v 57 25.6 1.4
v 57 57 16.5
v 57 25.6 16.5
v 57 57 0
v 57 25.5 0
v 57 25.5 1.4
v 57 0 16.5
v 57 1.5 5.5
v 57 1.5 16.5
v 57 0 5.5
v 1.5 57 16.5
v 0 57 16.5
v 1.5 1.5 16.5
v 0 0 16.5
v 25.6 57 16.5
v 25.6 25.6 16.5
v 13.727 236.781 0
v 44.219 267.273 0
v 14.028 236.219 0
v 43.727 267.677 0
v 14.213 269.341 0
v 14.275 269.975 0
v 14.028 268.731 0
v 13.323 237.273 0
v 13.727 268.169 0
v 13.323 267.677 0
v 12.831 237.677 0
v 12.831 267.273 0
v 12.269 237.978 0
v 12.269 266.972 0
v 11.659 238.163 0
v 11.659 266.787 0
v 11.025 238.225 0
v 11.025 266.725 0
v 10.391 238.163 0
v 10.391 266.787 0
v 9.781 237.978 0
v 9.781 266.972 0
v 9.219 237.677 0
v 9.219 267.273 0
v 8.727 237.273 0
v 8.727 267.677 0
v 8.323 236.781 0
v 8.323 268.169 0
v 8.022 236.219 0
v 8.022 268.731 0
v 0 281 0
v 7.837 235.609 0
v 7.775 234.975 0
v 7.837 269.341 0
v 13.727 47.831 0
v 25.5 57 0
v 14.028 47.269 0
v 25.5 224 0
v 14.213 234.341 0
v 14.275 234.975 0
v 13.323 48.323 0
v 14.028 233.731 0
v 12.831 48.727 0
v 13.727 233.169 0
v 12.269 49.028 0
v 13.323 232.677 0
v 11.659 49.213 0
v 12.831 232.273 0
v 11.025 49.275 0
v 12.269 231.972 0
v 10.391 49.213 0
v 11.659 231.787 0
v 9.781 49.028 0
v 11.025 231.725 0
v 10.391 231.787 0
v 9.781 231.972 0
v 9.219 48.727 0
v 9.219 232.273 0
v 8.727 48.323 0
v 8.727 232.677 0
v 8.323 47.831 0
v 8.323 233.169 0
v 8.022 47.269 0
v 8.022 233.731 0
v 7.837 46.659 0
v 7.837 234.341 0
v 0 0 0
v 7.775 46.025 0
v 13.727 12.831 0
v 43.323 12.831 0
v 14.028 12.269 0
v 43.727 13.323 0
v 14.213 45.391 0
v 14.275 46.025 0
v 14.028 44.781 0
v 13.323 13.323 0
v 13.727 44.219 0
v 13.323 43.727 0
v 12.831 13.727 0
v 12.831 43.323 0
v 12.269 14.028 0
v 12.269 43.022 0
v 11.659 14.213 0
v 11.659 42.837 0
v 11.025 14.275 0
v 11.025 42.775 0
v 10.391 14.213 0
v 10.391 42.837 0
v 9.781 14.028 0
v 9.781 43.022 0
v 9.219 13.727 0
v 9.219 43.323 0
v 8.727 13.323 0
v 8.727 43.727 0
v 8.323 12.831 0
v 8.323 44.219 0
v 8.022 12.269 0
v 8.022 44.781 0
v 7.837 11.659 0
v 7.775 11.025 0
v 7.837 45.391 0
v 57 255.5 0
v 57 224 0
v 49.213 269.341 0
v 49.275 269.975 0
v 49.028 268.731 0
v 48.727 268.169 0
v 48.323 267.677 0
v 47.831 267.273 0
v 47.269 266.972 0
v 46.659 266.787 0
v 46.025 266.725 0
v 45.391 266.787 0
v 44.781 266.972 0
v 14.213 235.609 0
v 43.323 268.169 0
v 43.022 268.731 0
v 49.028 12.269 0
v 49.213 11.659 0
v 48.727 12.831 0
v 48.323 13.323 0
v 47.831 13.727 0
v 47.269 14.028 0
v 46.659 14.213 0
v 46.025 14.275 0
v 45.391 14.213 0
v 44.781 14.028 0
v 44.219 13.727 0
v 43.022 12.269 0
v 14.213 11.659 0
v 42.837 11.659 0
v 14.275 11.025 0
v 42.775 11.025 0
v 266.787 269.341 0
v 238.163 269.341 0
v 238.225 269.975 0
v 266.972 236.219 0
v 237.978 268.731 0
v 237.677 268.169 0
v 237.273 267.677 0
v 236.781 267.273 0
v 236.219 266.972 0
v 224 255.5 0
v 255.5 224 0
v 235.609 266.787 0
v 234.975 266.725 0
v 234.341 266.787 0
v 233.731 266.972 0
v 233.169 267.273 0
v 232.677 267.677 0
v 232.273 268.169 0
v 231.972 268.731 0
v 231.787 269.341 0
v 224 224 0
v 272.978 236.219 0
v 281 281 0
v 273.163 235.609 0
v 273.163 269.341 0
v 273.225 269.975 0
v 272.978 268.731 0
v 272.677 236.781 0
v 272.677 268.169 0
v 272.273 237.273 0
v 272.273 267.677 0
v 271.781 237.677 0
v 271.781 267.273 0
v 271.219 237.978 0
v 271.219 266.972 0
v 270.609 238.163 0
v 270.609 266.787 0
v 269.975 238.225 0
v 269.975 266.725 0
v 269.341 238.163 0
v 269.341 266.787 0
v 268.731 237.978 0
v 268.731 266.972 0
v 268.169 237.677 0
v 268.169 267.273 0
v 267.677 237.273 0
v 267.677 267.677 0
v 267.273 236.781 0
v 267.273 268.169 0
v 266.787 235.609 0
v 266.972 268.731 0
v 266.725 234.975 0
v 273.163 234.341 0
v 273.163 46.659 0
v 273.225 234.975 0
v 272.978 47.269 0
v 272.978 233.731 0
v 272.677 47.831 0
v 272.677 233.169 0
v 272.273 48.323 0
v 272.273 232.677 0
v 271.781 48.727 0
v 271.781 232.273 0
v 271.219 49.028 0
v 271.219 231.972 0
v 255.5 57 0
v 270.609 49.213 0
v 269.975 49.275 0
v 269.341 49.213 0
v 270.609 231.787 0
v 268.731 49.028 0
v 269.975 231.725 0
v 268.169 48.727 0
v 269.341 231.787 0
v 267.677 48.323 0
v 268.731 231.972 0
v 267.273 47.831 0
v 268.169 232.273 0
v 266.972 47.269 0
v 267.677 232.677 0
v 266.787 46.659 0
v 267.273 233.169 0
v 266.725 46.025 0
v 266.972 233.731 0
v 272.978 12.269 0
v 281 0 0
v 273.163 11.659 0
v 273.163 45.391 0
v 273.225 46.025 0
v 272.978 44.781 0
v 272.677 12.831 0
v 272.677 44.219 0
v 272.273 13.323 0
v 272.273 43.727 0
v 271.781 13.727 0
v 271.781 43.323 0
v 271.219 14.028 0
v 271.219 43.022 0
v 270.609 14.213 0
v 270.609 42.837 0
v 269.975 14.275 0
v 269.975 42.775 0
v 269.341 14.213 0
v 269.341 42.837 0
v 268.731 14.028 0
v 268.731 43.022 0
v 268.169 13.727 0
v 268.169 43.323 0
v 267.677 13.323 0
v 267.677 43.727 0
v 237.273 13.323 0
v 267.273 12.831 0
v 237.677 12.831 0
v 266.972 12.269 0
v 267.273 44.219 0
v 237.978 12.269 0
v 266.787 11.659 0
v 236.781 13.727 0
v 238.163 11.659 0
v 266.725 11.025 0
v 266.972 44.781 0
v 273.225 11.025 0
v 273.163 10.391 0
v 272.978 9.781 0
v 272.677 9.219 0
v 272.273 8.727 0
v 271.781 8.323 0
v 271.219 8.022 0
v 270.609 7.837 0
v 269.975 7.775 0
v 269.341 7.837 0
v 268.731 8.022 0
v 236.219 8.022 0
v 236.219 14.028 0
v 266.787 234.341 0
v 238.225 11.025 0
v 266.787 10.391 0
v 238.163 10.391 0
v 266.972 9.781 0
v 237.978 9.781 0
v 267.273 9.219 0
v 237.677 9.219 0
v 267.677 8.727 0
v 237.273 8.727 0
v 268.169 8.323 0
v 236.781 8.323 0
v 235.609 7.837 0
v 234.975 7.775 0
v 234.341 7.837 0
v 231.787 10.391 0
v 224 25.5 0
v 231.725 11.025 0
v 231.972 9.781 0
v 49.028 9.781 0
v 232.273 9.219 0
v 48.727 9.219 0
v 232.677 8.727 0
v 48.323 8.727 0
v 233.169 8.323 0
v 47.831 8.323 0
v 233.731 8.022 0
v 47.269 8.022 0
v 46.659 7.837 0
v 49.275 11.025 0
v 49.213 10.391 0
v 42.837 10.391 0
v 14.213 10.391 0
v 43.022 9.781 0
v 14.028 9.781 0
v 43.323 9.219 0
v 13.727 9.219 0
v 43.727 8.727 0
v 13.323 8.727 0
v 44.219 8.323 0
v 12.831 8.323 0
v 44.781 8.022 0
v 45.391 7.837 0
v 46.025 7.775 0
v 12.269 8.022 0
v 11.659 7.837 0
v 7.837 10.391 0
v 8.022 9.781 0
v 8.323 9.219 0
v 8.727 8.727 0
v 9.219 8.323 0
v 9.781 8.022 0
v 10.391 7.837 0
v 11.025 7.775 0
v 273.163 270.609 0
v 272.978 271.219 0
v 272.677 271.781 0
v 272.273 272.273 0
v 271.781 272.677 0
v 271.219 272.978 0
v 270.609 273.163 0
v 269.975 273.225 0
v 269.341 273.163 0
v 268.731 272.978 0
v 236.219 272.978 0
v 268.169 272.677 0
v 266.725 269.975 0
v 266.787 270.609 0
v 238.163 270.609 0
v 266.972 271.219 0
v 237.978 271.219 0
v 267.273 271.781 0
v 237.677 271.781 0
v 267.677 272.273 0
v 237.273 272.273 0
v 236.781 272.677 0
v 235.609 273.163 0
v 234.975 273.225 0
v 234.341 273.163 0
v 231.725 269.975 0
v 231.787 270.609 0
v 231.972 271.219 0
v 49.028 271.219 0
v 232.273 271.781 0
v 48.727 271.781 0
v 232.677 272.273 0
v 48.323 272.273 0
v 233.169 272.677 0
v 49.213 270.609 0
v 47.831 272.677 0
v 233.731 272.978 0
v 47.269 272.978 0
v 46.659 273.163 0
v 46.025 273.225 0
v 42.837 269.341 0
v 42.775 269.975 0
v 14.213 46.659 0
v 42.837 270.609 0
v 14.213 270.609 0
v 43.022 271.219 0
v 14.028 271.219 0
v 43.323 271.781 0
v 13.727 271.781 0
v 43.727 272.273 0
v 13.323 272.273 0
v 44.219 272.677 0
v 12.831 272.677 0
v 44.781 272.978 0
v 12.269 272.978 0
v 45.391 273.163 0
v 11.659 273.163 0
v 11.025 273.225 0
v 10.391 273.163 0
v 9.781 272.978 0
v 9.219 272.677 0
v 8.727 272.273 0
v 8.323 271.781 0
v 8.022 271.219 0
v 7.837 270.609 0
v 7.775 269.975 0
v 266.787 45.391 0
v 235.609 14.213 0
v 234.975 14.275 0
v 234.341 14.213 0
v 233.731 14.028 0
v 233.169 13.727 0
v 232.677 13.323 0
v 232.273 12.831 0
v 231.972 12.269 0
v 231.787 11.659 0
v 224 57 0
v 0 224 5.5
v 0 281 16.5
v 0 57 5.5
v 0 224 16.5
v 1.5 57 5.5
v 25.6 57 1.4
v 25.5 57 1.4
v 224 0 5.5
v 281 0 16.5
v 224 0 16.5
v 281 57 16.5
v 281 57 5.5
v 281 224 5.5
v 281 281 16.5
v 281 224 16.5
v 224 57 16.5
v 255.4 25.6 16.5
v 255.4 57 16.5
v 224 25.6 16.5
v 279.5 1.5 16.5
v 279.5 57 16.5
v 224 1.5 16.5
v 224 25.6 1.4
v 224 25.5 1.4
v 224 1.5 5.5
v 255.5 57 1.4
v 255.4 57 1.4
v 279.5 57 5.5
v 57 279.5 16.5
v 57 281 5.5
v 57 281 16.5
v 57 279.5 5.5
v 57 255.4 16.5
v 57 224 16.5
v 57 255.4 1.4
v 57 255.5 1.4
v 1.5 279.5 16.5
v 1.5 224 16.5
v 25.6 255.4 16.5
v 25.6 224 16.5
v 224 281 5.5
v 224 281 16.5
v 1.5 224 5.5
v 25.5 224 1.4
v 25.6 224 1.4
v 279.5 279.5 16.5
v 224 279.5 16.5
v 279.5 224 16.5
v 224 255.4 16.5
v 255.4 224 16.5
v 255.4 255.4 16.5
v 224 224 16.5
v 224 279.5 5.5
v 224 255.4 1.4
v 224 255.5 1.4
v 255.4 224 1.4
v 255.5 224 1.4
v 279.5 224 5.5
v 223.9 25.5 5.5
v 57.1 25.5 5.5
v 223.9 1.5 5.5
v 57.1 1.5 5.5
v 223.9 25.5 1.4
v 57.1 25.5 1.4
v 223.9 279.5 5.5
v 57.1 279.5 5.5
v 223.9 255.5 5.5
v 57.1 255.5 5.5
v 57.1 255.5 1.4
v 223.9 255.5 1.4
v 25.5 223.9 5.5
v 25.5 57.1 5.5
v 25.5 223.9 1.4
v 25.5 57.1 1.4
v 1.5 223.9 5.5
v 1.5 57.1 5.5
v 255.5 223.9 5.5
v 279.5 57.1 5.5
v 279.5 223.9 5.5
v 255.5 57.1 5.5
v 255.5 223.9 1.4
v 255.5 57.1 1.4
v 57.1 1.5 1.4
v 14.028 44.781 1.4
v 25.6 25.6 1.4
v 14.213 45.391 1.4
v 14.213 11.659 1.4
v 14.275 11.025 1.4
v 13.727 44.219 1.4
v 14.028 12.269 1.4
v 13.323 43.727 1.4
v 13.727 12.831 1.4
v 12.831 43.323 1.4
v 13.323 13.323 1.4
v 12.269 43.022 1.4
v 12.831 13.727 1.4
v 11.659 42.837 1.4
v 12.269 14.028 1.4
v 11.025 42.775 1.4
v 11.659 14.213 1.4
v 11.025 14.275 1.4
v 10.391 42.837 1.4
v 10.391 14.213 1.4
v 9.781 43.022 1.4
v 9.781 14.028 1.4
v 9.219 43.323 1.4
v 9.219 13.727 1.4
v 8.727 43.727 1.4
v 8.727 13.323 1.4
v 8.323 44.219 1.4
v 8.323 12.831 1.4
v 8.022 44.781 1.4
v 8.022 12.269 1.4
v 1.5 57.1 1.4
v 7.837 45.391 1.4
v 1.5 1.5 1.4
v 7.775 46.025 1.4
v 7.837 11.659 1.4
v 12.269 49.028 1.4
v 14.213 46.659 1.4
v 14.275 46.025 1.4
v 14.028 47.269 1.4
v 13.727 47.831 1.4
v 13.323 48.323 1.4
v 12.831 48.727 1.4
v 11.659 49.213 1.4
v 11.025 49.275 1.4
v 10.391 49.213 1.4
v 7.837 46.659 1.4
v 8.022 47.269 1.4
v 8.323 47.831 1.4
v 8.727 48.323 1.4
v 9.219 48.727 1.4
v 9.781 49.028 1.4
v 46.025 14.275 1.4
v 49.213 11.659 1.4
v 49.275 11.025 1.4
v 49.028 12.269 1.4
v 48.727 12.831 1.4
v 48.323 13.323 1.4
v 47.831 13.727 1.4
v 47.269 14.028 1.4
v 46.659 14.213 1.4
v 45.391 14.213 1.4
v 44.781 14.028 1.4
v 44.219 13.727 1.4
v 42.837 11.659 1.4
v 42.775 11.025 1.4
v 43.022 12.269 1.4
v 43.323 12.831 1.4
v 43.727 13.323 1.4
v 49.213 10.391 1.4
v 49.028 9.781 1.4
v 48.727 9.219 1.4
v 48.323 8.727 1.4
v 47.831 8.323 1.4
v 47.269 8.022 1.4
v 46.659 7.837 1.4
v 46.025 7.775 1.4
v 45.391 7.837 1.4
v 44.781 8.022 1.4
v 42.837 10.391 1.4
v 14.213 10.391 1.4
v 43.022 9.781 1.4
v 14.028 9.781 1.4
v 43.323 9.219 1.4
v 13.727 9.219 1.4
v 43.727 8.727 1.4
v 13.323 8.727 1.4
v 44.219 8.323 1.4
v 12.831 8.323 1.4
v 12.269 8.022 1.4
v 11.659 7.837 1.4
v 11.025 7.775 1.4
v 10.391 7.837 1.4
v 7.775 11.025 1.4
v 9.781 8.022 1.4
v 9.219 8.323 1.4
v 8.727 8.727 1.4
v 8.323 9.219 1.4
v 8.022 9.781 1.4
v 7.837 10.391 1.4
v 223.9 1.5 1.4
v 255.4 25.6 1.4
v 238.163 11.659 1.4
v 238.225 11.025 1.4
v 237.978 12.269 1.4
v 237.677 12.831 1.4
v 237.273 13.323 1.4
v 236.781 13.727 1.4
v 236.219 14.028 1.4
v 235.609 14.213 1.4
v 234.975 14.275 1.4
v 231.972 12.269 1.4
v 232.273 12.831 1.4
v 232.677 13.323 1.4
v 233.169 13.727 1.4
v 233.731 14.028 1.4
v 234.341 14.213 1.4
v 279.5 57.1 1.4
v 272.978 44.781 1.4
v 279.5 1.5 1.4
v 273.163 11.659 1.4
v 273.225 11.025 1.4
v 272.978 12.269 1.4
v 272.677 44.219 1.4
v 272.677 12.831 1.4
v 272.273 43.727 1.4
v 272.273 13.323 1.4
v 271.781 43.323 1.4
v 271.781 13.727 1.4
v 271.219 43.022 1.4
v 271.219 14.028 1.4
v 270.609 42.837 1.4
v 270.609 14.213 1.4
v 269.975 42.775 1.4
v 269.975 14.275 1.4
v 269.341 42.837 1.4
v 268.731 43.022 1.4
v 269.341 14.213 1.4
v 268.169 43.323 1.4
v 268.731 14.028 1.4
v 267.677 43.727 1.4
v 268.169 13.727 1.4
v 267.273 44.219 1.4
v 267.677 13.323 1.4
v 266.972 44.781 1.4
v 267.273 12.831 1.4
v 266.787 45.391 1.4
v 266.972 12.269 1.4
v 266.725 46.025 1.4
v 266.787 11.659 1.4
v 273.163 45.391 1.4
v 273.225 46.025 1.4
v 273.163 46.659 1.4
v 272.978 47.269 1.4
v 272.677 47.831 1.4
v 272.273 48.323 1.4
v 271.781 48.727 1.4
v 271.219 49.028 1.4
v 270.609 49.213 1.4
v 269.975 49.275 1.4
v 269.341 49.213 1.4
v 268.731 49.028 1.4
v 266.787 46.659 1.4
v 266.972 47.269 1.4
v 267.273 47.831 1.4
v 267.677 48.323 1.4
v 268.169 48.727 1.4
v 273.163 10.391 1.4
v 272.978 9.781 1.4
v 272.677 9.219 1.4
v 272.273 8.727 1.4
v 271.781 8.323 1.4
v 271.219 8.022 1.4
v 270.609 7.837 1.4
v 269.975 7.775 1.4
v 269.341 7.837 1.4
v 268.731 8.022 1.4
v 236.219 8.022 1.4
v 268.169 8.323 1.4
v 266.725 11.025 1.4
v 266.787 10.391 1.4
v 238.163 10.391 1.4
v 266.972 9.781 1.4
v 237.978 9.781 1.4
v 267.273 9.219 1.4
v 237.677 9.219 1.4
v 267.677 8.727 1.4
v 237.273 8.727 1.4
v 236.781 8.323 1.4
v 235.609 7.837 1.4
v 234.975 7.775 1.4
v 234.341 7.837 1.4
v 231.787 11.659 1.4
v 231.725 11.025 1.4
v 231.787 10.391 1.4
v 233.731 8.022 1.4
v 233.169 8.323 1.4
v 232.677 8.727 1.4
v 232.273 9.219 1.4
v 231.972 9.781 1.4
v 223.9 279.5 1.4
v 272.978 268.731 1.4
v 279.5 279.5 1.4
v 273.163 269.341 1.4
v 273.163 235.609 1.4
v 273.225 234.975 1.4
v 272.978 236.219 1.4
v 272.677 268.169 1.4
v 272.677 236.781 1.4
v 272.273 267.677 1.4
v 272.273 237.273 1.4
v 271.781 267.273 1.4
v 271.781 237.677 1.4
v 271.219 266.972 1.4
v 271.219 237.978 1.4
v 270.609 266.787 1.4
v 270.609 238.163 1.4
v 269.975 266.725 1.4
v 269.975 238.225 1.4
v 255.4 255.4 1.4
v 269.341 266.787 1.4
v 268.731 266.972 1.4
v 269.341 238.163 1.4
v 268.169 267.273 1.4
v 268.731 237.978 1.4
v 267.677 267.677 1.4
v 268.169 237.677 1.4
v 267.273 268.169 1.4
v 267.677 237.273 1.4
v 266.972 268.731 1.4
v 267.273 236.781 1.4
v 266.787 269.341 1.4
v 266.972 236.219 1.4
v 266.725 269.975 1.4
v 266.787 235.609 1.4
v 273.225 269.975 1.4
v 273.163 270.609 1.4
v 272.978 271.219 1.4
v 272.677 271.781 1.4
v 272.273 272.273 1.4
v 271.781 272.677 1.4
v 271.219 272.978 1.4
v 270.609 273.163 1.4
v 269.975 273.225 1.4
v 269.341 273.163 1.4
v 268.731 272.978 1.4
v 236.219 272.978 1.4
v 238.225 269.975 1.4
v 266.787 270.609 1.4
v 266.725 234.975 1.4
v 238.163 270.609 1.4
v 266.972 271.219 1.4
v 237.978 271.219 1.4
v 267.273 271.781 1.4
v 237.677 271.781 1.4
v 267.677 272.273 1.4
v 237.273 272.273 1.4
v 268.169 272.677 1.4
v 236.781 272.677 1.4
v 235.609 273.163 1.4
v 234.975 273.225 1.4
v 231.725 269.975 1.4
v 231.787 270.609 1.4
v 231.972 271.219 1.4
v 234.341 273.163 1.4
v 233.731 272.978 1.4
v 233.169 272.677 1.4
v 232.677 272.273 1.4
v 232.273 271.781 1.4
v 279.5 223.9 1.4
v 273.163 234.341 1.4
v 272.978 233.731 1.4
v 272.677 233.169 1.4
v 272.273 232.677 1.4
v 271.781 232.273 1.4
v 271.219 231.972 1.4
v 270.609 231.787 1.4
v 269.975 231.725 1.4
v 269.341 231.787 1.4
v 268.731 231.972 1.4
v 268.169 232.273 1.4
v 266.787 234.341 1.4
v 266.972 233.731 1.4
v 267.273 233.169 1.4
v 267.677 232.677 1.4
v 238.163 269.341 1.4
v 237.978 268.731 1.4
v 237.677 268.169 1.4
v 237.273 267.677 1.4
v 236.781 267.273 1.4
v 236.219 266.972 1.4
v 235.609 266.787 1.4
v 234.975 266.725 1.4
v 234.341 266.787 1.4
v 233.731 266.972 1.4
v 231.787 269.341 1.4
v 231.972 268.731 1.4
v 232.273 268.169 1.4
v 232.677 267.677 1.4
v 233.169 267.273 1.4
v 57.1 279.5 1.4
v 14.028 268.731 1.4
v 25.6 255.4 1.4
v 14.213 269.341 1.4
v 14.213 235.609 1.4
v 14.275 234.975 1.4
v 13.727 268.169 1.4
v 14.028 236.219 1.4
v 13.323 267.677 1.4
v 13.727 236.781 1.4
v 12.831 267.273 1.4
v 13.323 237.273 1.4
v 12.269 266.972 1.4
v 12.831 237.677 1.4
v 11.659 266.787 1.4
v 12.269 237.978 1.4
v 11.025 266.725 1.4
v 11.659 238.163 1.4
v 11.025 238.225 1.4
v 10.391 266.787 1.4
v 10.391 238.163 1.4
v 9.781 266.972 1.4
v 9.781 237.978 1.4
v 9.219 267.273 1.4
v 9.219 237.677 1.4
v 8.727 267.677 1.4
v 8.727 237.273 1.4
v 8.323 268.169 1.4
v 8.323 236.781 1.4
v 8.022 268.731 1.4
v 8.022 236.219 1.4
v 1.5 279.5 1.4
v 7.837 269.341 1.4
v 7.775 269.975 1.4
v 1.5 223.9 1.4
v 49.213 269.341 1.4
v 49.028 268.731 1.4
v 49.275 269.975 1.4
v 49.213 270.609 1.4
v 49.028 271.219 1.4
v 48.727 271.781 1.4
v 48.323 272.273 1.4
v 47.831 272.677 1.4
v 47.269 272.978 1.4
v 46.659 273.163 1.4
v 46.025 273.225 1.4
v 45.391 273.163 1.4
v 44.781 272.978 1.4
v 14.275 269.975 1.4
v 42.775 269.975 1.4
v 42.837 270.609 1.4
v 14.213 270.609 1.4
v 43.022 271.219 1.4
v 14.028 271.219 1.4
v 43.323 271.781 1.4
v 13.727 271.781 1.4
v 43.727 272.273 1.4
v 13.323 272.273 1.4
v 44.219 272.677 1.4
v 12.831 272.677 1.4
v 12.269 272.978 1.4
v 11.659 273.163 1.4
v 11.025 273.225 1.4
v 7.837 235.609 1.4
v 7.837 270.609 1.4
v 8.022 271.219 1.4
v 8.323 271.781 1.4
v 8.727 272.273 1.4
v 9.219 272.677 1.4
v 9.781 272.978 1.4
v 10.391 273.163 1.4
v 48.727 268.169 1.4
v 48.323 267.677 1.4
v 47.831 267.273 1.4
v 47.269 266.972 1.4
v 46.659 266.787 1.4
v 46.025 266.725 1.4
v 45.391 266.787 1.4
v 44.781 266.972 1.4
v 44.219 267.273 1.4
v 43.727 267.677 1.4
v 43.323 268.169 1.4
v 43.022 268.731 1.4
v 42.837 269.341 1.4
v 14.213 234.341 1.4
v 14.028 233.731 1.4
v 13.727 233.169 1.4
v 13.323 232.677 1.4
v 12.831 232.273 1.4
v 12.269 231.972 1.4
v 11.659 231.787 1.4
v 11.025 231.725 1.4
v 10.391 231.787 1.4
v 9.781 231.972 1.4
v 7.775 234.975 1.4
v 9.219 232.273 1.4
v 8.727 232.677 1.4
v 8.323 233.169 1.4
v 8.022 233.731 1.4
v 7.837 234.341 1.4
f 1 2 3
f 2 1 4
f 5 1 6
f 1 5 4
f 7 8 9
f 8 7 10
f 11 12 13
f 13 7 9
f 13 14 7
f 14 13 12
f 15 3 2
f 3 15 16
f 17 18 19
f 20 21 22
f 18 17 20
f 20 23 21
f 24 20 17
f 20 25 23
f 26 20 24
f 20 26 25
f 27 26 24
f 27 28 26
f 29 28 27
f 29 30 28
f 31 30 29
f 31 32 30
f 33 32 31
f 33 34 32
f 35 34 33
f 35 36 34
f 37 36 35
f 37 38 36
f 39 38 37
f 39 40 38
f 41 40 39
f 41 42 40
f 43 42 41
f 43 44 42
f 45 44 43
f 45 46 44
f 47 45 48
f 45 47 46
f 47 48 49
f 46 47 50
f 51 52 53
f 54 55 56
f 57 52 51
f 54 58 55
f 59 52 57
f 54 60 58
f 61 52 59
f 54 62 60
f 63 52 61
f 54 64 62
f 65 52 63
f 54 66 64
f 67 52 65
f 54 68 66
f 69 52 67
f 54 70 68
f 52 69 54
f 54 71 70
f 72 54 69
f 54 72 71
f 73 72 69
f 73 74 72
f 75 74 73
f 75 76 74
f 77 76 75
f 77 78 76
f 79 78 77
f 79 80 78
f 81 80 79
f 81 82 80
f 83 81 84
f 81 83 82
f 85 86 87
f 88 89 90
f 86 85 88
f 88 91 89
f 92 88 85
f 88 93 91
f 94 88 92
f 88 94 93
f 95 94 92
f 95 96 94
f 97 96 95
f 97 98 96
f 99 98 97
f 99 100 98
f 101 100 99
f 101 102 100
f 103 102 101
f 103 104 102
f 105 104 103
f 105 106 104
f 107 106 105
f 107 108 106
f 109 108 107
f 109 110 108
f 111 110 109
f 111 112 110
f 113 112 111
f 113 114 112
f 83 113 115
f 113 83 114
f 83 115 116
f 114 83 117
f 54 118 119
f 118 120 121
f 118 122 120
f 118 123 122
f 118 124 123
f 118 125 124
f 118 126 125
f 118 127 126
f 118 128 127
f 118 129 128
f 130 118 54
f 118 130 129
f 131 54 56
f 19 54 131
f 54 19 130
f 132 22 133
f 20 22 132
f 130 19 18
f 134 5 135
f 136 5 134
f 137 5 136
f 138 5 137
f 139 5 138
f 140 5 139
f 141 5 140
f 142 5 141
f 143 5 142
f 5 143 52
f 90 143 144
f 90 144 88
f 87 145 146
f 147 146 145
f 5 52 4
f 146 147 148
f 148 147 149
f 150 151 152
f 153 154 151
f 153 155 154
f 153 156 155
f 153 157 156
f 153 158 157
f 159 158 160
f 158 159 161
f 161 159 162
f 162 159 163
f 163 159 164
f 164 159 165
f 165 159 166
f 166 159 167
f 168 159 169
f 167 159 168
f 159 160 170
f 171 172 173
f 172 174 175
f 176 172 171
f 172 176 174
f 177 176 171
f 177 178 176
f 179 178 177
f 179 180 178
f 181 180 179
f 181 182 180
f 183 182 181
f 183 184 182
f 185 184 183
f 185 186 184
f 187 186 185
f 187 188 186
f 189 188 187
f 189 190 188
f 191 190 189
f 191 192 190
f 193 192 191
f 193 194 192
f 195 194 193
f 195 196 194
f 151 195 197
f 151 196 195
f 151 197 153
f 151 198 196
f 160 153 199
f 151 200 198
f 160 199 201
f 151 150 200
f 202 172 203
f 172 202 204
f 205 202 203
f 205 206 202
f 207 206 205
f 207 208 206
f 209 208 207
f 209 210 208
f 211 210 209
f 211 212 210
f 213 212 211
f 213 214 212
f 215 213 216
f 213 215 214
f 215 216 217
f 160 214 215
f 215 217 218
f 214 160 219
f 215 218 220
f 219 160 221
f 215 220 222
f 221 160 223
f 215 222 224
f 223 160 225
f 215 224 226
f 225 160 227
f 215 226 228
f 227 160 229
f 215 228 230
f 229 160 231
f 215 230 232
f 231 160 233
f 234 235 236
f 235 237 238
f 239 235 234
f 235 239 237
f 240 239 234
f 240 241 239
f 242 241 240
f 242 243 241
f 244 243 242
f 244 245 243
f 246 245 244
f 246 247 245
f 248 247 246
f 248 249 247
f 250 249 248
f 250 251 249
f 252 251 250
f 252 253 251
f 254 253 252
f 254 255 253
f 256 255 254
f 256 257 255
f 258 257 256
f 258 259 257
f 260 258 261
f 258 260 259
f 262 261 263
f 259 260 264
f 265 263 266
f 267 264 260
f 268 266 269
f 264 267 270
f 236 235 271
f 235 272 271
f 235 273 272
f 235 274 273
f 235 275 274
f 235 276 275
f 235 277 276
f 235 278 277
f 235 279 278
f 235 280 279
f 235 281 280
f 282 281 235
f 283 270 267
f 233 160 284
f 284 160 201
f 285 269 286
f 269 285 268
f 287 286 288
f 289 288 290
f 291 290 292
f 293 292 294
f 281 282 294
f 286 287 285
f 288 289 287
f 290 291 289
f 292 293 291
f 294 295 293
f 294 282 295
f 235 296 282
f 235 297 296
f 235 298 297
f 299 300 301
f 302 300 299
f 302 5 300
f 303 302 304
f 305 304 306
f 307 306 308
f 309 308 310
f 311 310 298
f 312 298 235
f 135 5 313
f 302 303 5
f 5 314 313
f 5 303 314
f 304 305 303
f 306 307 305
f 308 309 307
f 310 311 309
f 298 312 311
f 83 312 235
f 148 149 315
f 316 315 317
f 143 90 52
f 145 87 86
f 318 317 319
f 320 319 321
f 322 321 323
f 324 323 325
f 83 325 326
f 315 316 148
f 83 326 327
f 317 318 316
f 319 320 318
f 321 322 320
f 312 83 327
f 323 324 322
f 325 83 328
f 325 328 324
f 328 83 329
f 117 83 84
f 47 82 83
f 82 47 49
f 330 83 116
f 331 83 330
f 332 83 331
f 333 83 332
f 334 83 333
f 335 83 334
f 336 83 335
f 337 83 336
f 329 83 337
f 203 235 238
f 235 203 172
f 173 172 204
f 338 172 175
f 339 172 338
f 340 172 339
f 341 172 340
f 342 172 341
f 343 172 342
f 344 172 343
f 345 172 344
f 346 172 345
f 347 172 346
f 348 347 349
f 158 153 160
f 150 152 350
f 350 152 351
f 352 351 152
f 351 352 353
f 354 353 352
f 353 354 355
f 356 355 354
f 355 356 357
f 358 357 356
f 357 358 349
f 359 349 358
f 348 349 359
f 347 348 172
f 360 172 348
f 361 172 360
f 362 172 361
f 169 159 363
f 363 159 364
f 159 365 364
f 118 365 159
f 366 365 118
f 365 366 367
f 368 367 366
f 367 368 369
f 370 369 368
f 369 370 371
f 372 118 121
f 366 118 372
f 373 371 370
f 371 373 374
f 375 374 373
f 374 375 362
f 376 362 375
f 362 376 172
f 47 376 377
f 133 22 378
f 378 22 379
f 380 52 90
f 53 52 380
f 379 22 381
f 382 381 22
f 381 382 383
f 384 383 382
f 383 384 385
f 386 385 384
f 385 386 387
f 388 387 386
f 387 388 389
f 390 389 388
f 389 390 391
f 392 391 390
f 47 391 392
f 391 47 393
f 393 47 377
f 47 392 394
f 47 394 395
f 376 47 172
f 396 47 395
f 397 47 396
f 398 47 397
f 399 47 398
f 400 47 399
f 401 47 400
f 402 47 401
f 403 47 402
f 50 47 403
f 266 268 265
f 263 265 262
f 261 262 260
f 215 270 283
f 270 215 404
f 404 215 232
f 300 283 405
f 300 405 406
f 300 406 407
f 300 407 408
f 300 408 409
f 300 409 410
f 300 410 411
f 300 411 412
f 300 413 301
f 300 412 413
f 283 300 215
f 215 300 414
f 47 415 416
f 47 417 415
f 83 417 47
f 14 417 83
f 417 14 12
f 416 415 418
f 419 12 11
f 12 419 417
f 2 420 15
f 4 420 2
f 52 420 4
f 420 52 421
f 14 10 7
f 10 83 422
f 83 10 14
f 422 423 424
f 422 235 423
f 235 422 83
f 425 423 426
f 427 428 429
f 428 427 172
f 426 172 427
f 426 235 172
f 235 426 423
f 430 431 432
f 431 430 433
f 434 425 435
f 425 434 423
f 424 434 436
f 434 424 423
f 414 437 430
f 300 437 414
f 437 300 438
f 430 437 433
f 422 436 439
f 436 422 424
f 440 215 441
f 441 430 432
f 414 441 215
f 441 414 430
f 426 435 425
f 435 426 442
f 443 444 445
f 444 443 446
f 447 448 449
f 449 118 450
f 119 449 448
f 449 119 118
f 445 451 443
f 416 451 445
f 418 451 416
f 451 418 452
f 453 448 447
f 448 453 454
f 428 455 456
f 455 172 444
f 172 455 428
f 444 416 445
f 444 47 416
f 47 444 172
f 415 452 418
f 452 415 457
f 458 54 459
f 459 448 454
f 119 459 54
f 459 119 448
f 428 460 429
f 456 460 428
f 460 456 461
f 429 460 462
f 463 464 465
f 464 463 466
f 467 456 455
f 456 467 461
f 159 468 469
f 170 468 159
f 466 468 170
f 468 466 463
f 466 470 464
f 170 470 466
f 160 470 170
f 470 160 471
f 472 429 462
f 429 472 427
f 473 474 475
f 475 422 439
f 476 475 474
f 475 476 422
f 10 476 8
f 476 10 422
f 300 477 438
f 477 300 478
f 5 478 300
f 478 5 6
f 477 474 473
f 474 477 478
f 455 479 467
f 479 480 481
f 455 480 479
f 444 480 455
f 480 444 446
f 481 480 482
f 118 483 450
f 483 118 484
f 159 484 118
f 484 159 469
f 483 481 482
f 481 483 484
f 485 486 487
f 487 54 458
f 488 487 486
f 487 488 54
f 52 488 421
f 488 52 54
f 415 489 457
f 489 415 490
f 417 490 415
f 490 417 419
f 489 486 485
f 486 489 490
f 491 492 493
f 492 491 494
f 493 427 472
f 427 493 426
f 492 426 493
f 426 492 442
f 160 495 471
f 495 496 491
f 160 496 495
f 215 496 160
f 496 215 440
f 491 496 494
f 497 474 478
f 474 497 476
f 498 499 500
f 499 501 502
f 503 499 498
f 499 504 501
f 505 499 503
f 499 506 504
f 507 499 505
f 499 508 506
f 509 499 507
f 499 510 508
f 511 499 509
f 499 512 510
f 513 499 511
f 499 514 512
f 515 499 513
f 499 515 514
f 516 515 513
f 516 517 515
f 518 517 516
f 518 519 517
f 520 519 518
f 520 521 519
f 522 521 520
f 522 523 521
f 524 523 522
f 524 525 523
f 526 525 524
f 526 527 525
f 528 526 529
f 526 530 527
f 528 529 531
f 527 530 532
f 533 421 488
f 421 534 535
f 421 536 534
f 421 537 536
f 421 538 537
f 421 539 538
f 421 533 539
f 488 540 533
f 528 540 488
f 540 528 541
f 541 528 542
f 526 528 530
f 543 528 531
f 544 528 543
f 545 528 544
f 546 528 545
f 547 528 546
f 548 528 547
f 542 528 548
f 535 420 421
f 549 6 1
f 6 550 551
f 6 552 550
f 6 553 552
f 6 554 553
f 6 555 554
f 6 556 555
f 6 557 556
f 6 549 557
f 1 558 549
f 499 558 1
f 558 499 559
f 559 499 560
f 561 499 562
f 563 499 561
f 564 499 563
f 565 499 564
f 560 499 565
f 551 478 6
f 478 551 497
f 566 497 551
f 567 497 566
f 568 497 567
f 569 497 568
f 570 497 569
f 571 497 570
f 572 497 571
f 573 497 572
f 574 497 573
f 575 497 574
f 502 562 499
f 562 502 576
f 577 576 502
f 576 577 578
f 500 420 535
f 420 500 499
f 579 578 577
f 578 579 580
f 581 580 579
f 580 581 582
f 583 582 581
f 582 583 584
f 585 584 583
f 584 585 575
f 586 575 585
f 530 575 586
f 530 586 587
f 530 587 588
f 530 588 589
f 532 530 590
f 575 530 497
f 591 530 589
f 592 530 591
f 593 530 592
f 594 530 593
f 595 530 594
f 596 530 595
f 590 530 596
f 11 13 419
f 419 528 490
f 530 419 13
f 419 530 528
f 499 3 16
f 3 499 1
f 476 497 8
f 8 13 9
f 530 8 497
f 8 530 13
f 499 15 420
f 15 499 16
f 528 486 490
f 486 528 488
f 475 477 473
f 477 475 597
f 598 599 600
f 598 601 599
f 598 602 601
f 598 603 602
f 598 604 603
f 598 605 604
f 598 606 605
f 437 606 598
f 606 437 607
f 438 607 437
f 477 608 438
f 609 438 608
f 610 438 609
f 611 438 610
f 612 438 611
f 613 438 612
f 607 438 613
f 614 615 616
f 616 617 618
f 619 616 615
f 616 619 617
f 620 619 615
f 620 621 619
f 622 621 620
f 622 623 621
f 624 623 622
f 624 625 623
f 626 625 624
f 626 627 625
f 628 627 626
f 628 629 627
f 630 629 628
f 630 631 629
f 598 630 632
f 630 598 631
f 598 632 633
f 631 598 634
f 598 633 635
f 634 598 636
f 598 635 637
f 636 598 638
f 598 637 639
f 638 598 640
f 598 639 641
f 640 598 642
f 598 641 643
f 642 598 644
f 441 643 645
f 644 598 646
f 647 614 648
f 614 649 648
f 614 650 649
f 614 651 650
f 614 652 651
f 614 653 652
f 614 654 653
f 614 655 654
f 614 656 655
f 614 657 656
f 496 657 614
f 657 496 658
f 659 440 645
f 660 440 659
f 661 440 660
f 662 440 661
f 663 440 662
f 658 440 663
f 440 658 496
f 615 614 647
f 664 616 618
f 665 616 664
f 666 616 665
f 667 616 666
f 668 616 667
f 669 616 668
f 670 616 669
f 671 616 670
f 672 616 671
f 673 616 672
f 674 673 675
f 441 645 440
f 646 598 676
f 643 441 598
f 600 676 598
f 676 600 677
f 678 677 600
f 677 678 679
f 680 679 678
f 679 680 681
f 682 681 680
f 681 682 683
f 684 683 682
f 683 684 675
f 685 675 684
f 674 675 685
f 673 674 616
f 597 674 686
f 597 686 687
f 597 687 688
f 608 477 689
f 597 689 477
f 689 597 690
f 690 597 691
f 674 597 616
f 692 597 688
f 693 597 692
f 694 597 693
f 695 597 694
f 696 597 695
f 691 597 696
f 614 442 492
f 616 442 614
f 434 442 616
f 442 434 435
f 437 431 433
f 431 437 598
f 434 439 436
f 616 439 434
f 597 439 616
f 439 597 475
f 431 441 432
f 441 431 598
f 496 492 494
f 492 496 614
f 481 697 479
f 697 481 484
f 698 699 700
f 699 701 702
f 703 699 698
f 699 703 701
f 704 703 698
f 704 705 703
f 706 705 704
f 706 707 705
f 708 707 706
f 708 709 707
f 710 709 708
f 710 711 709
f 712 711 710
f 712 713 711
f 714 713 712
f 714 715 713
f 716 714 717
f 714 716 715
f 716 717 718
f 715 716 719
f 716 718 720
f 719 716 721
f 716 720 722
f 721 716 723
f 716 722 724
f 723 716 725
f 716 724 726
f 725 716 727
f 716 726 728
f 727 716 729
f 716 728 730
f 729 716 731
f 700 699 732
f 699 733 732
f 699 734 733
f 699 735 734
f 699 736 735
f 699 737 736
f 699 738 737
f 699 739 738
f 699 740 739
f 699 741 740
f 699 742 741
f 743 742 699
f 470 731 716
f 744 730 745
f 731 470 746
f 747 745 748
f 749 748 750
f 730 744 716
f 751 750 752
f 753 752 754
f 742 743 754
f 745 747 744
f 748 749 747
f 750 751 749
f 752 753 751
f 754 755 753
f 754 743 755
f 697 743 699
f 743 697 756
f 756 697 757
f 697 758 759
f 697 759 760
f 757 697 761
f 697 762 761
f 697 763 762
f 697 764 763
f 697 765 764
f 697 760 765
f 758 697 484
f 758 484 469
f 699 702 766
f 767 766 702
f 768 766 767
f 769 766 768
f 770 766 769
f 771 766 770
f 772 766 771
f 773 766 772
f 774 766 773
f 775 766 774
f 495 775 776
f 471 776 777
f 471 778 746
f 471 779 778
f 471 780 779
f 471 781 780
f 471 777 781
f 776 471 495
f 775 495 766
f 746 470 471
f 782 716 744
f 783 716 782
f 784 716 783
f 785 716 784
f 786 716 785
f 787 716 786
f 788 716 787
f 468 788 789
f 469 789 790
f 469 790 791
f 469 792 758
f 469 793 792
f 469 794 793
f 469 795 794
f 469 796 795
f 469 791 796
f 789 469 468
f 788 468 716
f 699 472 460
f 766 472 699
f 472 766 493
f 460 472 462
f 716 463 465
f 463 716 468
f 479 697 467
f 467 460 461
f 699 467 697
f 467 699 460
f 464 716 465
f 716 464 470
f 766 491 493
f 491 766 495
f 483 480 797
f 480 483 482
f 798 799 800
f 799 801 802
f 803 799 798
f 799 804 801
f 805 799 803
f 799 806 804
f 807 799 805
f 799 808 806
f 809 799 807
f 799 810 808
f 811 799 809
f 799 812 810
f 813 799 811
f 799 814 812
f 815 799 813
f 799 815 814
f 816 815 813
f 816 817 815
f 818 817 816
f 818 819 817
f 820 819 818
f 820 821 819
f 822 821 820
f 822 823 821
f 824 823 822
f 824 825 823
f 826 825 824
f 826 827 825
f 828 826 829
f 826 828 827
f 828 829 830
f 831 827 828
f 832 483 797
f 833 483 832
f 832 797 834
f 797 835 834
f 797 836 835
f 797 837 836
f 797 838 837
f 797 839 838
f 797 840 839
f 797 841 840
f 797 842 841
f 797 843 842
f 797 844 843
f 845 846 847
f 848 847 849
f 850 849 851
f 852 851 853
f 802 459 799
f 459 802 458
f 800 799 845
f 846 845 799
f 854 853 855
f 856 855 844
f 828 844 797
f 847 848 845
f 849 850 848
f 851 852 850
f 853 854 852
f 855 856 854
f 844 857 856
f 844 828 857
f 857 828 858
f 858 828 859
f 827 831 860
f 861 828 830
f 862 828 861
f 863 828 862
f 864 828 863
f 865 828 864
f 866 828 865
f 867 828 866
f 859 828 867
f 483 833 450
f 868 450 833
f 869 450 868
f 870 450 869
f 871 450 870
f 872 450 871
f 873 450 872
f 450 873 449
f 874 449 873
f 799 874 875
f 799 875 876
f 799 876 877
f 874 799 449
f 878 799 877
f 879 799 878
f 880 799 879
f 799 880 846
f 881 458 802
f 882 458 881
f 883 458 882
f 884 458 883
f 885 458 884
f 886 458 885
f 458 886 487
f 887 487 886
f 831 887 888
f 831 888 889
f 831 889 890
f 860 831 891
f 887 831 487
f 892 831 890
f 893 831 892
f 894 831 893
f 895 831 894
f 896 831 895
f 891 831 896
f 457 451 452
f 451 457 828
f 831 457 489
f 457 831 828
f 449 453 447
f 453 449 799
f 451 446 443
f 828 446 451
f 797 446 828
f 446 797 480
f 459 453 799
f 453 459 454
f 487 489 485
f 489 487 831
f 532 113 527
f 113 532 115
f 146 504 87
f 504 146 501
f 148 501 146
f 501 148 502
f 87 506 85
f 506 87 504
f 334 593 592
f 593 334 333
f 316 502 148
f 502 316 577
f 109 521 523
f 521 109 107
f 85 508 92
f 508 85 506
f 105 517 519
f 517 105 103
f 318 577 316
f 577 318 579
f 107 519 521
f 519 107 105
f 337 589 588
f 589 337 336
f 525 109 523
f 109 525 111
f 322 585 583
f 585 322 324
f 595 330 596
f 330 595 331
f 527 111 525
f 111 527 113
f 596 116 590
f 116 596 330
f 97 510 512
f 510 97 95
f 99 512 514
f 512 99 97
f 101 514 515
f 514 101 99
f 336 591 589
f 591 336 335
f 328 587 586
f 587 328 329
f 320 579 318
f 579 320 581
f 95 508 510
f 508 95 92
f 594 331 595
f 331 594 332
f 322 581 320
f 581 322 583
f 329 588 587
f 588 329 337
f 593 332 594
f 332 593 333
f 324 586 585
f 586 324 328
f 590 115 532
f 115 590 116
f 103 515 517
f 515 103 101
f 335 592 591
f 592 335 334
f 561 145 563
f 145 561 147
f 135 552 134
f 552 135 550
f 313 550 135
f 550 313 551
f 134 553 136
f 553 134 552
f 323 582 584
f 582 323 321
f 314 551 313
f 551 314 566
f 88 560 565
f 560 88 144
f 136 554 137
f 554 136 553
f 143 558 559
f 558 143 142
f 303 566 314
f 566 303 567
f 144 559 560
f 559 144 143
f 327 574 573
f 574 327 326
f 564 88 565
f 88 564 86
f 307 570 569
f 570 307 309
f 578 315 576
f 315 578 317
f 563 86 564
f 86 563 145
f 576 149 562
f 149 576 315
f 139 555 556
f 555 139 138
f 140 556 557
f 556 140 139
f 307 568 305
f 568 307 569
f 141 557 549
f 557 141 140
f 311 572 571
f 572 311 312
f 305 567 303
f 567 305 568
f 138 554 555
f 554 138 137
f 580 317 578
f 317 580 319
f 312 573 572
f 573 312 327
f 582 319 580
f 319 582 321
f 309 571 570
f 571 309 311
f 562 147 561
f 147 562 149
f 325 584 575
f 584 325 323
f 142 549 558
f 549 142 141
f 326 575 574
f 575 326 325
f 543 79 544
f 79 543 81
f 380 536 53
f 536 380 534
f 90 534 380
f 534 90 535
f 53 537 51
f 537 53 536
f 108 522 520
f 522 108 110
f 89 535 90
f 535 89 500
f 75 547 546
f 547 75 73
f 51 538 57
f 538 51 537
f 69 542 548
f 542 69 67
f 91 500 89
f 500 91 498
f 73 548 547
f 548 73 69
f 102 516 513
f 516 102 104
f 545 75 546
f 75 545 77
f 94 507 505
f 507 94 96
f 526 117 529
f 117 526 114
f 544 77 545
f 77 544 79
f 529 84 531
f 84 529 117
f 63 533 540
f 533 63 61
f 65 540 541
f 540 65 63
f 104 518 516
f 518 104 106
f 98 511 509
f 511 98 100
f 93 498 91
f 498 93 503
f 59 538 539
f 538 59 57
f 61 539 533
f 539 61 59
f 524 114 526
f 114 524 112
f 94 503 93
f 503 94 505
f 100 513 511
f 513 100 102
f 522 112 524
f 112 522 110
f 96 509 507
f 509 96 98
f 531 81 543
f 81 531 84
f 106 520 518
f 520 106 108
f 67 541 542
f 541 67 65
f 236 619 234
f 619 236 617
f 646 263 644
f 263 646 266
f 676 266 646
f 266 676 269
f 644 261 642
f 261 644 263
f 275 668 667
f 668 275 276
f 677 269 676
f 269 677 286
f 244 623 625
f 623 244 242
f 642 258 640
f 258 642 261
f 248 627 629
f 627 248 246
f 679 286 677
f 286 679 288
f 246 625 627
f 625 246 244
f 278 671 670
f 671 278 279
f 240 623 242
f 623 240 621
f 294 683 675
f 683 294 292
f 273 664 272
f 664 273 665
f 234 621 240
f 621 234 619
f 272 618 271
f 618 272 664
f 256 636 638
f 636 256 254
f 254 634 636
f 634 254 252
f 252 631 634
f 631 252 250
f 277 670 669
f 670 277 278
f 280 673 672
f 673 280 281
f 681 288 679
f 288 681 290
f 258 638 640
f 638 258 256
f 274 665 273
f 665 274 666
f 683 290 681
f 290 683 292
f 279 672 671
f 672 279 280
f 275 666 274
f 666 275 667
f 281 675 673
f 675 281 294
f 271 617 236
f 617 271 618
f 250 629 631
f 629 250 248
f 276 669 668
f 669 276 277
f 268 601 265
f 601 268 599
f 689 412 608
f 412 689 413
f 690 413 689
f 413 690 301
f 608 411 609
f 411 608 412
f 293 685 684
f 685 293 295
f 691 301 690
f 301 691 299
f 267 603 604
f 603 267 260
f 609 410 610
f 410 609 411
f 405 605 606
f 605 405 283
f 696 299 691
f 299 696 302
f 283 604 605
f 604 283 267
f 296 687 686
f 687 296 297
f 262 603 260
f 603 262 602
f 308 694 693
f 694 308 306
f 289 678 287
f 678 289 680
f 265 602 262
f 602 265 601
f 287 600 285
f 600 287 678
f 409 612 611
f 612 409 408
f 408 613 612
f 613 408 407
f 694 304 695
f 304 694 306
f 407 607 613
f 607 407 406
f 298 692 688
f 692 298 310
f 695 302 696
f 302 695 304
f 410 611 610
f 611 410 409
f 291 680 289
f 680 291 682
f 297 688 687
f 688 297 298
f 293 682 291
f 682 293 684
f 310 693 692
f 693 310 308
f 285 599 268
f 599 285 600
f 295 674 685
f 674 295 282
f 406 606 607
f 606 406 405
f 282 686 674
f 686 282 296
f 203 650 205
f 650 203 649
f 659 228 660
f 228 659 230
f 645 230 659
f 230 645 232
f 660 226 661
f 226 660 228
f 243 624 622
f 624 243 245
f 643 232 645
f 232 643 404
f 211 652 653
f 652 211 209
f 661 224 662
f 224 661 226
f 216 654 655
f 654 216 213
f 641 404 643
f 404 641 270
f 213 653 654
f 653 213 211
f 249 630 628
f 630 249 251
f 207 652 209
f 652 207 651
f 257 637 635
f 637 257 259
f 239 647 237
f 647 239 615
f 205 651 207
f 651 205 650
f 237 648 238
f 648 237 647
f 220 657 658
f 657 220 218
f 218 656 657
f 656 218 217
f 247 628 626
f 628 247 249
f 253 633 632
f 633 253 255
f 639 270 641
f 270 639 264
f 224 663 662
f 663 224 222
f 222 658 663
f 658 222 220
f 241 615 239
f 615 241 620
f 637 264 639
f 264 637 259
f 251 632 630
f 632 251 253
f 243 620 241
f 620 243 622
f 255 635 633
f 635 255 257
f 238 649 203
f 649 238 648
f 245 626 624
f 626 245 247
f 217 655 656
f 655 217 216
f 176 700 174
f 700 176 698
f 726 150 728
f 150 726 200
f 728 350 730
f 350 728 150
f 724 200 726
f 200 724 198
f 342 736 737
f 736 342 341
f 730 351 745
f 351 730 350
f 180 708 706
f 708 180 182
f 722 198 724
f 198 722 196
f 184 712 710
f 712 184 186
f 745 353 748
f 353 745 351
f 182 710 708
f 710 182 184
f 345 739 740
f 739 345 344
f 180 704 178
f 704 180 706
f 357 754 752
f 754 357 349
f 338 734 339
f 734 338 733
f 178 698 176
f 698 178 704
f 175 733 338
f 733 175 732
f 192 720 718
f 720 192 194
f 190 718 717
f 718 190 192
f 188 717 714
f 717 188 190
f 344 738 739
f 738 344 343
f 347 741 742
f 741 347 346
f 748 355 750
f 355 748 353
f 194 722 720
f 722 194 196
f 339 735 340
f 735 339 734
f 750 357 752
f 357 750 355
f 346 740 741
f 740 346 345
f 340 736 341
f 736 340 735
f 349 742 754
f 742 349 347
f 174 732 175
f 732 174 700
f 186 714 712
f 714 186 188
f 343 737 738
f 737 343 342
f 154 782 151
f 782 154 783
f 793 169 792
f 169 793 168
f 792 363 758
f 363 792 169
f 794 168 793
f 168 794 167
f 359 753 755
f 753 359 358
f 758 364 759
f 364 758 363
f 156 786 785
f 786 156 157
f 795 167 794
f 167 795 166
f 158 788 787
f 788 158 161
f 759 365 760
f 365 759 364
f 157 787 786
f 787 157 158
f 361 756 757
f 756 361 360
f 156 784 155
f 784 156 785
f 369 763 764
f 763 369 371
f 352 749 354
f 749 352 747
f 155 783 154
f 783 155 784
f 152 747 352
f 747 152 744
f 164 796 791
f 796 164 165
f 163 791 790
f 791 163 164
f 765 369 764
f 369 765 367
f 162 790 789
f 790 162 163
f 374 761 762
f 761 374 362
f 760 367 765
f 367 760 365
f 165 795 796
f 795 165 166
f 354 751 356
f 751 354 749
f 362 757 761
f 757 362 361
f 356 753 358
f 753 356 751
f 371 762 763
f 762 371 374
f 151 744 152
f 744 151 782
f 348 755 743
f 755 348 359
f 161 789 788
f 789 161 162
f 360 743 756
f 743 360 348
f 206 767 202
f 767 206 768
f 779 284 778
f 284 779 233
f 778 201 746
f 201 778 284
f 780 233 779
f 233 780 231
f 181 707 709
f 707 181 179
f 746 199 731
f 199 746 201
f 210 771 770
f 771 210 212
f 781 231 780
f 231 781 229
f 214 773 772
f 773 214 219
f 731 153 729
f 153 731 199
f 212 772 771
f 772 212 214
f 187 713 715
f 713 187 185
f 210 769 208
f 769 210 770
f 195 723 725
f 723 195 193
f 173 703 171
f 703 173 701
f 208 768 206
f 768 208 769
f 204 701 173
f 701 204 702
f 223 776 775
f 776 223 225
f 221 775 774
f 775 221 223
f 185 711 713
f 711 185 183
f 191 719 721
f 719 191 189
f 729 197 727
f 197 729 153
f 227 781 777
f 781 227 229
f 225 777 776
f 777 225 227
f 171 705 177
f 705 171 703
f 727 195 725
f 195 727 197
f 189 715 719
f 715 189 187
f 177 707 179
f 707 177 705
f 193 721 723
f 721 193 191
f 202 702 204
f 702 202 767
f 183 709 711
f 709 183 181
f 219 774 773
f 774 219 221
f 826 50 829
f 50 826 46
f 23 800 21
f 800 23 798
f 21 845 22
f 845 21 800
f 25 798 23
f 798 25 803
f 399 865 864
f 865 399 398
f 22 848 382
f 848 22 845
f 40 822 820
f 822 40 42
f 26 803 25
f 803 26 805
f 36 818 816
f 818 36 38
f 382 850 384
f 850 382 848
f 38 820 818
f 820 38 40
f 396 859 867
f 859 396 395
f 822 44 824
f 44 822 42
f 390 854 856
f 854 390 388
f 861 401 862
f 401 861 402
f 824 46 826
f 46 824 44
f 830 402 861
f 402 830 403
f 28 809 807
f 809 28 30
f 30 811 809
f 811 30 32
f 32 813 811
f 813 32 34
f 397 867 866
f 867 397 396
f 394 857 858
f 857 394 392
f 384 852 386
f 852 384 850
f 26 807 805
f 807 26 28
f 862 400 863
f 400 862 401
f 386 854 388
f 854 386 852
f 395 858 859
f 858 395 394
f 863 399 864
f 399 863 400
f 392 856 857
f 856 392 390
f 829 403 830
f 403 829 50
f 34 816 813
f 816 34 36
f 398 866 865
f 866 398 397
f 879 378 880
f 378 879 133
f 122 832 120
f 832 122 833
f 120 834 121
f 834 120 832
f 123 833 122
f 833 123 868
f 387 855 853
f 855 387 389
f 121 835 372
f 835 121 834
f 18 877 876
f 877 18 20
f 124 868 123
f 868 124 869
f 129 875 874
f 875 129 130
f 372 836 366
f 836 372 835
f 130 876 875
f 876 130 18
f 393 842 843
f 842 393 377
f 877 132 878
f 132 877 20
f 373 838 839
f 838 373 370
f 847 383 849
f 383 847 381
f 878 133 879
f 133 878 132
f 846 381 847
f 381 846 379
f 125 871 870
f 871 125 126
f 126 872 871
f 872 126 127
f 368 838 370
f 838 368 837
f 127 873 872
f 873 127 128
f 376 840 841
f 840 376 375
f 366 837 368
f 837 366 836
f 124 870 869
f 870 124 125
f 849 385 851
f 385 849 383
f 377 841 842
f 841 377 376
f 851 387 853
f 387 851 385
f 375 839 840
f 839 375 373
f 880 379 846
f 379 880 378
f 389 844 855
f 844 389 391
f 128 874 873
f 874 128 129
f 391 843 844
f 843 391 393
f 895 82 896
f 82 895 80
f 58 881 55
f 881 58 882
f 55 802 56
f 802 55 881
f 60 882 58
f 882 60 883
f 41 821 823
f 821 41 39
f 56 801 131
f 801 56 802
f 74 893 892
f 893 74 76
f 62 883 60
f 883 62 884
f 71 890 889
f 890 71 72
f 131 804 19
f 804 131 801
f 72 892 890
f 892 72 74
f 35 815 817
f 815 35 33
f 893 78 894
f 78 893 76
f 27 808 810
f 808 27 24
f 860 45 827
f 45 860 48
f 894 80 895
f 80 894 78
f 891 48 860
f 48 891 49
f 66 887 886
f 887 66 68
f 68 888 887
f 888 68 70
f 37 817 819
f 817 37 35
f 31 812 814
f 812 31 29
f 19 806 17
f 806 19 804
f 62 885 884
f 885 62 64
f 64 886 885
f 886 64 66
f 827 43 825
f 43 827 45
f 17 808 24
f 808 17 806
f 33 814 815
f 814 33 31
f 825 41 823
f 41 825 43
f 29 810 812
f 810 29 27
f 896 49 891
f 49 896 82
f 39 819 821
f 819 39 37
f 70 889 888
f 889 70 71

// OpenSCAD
// C-frame for PIU bracketless conversion
// Reference: C_Frame_AC_Accurate.stl (279.4×279.4×16.5mm)

// Defaults (used when opening this file standalone)
frame_w  = 278;    // panel width  → used as default for both axes
frame_h  = 278;    // panel height

// Fixed dimensions
wall_t   = 1.5;
fh       = 16.5;   // total frame height
arm_len  = 55.5;   // must match frame_mod.scad
arm_w    = 24.0;
piece_h  = 15.0;
arm_beam_h = 5.5;  // side arm height (from STL reference)

pad_from_outer    = 9.525;
side_hole_spacing = 35;
screw_hole_d      = 6.5;   // M6 clearance

$fn = 32;

module corner_holes() {
    ph  = wall_t + pad_from_outer;
    leg = wall_t + pad_from_outer + side_hole_spacing;
    for (pos = [[ph, ph], [leg, ph], [ph, leg]])
        translate([pos[0], pos[1], -0.1])
            cylinder(h = fh + 0.2, d = screw_hole_d);
}

module corner_pocket() {
    translate([0, 0, -0.1])
    union() {
        cube([arm_len + 0.1, arm_w   + 0.1, piece_h + 0.2]);
        cube([arm_w   + 0.1, arm_len + 0.1, piece_h + 0.2]);
    }
}

// pw / ph = panel width / height (inner face dimensions)
module frame(pw = frame_w, ph = frame_h) {
    ow = pw + 2 * wall_t;   // outer X
    oh = ph + 2 * wall_t;   // outer Y
    csz = arm_len + wall_t; // corner block size
    bw  = arm_w   + wall_t; // side arm width
    pz  = fh - piece_h;     // pocket start Z

    difference() {
        union() {
            // Corner blocks — full height
            cube([csz, csz, fh]);
            translate([ow-csz, 0,    0]) cube([csz, csz, fh]);
            translate([0,    oh-csz, 0]) cube([csz, csz, fh]);
            translate([ow-csz, oh-csz, 0]) cube([csz, csz, fh]);

            // Side arms — lower height, overlapping corner blocks by 0.1mm
            translate([csz-0.1, 0,      0]) cube([ow-2*csz+0.2, bw,  arm_beam_h]); // bottom
            translate([csz-0.1, oh-bw,  0]) cube([ow-2*csz+0.2, bw,  arm_beam_h]); // top
            translate([0,     csz-0.1,  0]) cube([bw, oh-2*csz+0.2,  arm_beam_h]); // left
            translate([ow-bw, csz-0.1,  0]) cube([bw, oh-2*csz+0.2,  arm_beam_h]); // right
        }

        // L-shaped corner pockets
        translate([wall_t,   wall_t,   pz]) corner_pocket();                           // BL
        translate([ow-wall_t, wall_t,  pz]) mirror([1,0,0]) corner_pocket();           // BR
        translate([ow-wall_t, oh-wall_t, pz]) rotate([0,0,180]) corner_pocket();       // TR
        translate([wall_t,   oh-wall_t, pz]) mirror([0,1,0]) corner_pocket();          // TL

        // Screw holes (3 per corner)
        corner_holes();                                            // BL
        translate([ow, 0,  0]) mirror([1,0,0]) corner_holes();   // BR
        translate([ow, oh, 0]) rotate([0,0,180]) corner_holes(); // TR
        translate([0,  oh, 0]) mirror([0,1,0]) corner_holes();   // TL
    }
}

frame();
